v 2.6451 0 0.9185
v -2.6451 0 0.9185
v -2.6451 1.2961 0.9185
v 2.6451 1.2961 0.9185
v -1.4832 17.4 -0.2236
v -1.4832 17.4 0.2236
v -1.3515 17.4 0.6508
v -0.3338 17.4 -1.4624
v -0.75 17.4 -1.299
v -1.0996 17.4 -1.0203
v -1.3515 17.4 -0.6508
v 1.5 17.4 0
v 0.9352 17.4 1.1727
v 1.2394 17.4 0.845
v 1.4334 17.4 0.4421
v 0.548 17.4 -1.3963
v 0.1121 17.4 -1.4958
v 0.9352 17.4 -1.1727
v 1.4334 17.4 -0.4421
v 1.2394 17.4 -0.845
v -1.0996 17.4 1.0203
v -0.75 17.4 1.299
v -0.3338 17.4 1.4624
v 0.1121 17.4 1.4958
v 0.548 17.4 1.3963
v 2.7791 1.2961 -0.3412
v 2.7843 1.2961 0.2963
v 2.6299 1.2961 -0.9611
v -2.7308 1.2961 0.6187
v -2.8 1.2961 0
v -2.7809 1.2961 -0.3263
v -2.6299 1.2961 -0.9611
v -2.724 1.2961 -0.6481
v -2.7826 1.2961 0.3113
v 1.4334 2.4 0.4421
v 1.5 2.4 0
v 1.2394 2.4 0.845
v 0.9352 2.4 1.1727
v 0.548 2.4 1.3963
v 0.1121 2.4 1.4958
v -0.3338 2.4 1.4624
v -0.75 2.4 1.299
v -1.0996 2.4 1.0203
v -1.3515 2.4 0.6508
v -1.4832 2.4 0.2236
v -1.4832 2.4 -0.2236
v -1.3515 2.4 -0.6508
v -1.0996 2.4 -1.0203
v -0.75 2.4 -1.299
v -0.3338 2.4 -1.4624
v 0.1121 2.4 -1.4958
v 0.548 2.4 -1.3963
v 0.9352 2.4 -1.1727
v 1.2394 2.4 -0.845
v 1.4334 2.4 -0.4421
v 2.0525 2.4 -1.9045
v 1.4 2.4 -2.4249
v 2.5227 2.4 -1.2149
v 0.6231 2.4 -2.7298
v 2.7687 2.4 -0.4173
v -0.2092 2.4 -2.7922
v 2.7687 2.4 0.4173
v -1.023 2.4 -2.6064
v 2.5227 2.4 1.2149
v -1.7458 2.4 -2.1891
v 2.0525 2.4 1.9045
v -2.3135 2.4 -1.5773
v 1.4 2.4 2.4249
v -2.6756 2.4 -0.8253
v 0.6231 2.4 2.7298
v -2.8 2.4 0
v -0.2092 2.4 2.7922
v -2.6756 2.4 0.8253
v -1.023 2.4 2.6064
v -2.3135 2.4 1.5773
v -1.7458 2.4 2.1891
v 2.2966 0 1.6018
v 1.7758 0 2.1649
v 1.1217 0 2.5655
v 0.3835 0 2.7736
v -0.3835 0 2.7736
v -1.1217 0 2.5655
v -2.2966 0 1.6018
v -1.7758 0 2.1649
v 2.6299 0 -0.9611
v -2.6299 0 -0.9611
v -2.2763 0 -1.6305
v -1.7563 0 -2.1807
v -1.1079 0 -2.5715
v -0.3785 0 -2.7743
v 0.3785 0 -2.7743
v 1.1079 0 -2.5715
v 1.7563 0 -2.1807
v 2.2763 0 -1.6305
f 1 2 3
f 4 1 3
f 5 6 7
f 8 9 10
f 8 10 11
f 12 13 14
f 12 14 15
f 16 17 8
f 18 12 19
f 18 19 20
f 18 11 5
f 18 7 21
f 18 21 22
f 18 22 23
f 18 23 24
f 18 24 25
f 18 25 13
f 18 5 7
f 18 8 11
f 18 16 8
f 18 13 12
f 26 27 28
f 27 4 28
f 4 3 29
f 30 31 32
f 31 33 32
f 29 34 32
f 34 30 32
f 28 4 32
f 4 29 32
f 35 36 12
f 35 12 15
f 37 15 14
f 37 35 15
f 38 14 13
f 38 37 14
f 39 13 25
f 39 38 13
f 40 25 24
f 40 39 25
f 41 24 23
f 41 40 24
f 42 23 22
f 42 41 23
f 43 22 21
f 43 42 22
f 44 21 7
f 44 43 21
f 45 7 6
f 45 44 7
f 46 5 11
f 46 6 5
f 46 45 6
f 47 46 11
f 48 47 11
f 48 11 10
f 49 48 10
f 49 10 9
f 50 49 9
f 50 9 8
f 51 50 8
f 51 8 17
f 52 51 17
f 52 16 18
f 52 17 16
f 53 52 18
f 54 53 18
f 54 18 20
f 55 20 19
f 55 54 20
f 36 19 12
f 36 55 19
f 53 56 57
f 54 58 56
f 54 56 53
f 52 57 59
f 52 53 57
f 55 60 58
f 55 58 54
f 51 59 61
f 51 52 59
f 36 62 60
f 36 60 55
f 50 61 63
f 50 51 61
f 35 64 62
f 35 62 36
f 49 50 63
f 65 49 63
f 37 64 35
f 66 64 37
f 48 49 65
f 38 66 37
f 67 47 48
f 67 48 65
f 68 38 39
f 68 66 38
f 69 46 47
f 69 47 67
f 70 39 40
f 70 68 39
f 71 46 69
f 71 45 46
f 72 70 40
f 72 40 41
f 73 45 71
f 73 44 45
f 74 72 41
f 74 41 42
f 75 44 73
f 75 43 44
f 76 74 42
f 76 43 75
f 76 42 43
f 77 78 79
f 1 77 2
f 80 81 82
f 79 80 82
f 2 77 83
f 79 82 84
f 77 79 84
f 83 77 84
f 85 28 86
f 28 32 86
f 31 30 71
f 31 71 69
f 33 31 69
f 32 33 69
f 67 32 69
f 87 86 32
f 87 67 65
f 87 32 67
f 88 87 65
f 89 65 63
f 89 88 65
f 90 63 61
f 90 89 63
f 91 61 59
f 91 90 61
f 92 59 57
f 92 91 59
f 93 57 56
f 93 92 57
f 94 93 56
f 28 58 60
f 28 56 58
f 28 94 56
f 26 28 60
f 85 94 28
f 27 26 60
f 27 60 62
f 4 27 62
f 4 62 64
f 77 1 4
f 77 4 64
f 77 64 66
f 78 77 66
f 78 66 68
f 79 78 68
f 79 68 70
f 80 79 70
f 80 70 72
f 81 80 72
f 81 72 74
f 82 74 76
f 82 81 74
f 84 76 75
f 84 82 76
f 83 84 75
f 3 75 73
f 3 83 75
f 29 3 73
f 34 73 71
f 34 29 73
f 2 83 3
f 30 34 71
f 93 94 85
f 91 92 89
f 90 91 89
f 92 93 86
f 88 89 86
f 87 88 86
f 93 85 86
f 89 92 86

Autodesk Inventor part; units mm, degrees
ref_plane "YZ Plane" through (0, 0, 0) normal (1, 0, 0) x (0, 1, 0)
ref_plane "XZ Plane" through (0, 0, 0) normal (0, 1, 0) x (-1, 0, 0)
ref_plane "XY Plane" through (0, 0, 0) normal (0, 0, 1) x (1, 0, 0)
sketch "Esboço1" plane through (0, 0, 0) normal (0, 1, 0) x (-1, 0, 0)
  circle A0 centre (0, 0) radius 2.8
  dimension "d0" = 5.6
extrude "Extrusão1" add sketch "Esboço1" along normal blind 2.4
sketch "Esboço2" plane through (0, 0, 0) normal (1, 0, 0) x (0, 1, 0)
  line L0 (0, 0.9185) -> (1.2961, 0.9185)
  line L1 (1.2961, 0.9185) -> (1.2961, -0.9611)
  line L2 (1.2961, -0.9611) -> (0, -0.9611)
  line L3 (0, -0.9611) -> (0, 0.9185)
  point P0 (0, 0)
extrude "Extrusão2" cut sketch "Esboço2" along normal through all both and the other way through all
sketch "Esboço3" plane through (0, 2.4, 0) normal (0, 1, 0) x (1, 0, 0)
  circle A0 centre (0, 0) radius 2.8 projected
  circle A1 centre (0, 0) radius 1.5
  dimension "d5" = 3
extrude "Extrusão3" add sketch "Esboço3" along normal blind 15 contours A1
thread "Rosca1" size "M3x0.5" class "6g" standard "ANSI Metric M Profile" full length
properties part number "AA-Parafuso-M3-30"
